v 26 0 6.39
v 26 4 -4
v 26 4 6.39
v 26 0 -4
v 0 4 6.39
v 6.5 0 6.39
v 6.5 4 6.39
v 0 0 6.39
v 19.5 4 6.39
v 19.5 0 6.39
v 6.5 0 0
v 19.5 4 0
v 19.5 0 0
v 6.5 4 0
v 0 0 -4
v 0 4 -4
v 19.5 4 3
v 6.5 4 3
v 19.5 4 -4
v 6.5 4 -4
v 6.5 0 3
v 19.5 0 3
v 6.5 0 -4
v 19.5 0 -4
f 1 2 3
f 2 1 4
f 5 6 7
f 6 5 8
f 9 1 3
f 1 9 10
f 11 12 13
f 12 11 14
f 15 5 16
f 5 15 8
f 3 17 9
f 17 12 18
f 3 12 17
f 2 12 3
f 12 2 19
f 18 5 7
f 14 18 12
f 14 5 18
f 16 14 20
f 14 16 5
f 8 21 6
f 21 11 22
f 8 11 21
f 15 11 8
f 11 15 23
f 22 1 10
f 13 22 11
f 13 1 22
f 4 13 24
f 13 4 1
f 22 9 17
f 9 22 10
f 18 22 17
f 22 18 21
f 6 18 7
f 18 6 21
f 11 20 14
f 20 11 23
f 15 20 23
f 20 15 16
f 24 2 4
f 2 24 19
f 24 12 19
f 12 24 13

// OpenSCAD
difference() {
    cube([26,4,6.39]);
    translate([6.5,0,3]) cube([13,4,4]);
}

translate([0,0,-4]) cube([6.5,4,4]);
translate([19.5,0,-4]) cube([6.5,4,4]);
